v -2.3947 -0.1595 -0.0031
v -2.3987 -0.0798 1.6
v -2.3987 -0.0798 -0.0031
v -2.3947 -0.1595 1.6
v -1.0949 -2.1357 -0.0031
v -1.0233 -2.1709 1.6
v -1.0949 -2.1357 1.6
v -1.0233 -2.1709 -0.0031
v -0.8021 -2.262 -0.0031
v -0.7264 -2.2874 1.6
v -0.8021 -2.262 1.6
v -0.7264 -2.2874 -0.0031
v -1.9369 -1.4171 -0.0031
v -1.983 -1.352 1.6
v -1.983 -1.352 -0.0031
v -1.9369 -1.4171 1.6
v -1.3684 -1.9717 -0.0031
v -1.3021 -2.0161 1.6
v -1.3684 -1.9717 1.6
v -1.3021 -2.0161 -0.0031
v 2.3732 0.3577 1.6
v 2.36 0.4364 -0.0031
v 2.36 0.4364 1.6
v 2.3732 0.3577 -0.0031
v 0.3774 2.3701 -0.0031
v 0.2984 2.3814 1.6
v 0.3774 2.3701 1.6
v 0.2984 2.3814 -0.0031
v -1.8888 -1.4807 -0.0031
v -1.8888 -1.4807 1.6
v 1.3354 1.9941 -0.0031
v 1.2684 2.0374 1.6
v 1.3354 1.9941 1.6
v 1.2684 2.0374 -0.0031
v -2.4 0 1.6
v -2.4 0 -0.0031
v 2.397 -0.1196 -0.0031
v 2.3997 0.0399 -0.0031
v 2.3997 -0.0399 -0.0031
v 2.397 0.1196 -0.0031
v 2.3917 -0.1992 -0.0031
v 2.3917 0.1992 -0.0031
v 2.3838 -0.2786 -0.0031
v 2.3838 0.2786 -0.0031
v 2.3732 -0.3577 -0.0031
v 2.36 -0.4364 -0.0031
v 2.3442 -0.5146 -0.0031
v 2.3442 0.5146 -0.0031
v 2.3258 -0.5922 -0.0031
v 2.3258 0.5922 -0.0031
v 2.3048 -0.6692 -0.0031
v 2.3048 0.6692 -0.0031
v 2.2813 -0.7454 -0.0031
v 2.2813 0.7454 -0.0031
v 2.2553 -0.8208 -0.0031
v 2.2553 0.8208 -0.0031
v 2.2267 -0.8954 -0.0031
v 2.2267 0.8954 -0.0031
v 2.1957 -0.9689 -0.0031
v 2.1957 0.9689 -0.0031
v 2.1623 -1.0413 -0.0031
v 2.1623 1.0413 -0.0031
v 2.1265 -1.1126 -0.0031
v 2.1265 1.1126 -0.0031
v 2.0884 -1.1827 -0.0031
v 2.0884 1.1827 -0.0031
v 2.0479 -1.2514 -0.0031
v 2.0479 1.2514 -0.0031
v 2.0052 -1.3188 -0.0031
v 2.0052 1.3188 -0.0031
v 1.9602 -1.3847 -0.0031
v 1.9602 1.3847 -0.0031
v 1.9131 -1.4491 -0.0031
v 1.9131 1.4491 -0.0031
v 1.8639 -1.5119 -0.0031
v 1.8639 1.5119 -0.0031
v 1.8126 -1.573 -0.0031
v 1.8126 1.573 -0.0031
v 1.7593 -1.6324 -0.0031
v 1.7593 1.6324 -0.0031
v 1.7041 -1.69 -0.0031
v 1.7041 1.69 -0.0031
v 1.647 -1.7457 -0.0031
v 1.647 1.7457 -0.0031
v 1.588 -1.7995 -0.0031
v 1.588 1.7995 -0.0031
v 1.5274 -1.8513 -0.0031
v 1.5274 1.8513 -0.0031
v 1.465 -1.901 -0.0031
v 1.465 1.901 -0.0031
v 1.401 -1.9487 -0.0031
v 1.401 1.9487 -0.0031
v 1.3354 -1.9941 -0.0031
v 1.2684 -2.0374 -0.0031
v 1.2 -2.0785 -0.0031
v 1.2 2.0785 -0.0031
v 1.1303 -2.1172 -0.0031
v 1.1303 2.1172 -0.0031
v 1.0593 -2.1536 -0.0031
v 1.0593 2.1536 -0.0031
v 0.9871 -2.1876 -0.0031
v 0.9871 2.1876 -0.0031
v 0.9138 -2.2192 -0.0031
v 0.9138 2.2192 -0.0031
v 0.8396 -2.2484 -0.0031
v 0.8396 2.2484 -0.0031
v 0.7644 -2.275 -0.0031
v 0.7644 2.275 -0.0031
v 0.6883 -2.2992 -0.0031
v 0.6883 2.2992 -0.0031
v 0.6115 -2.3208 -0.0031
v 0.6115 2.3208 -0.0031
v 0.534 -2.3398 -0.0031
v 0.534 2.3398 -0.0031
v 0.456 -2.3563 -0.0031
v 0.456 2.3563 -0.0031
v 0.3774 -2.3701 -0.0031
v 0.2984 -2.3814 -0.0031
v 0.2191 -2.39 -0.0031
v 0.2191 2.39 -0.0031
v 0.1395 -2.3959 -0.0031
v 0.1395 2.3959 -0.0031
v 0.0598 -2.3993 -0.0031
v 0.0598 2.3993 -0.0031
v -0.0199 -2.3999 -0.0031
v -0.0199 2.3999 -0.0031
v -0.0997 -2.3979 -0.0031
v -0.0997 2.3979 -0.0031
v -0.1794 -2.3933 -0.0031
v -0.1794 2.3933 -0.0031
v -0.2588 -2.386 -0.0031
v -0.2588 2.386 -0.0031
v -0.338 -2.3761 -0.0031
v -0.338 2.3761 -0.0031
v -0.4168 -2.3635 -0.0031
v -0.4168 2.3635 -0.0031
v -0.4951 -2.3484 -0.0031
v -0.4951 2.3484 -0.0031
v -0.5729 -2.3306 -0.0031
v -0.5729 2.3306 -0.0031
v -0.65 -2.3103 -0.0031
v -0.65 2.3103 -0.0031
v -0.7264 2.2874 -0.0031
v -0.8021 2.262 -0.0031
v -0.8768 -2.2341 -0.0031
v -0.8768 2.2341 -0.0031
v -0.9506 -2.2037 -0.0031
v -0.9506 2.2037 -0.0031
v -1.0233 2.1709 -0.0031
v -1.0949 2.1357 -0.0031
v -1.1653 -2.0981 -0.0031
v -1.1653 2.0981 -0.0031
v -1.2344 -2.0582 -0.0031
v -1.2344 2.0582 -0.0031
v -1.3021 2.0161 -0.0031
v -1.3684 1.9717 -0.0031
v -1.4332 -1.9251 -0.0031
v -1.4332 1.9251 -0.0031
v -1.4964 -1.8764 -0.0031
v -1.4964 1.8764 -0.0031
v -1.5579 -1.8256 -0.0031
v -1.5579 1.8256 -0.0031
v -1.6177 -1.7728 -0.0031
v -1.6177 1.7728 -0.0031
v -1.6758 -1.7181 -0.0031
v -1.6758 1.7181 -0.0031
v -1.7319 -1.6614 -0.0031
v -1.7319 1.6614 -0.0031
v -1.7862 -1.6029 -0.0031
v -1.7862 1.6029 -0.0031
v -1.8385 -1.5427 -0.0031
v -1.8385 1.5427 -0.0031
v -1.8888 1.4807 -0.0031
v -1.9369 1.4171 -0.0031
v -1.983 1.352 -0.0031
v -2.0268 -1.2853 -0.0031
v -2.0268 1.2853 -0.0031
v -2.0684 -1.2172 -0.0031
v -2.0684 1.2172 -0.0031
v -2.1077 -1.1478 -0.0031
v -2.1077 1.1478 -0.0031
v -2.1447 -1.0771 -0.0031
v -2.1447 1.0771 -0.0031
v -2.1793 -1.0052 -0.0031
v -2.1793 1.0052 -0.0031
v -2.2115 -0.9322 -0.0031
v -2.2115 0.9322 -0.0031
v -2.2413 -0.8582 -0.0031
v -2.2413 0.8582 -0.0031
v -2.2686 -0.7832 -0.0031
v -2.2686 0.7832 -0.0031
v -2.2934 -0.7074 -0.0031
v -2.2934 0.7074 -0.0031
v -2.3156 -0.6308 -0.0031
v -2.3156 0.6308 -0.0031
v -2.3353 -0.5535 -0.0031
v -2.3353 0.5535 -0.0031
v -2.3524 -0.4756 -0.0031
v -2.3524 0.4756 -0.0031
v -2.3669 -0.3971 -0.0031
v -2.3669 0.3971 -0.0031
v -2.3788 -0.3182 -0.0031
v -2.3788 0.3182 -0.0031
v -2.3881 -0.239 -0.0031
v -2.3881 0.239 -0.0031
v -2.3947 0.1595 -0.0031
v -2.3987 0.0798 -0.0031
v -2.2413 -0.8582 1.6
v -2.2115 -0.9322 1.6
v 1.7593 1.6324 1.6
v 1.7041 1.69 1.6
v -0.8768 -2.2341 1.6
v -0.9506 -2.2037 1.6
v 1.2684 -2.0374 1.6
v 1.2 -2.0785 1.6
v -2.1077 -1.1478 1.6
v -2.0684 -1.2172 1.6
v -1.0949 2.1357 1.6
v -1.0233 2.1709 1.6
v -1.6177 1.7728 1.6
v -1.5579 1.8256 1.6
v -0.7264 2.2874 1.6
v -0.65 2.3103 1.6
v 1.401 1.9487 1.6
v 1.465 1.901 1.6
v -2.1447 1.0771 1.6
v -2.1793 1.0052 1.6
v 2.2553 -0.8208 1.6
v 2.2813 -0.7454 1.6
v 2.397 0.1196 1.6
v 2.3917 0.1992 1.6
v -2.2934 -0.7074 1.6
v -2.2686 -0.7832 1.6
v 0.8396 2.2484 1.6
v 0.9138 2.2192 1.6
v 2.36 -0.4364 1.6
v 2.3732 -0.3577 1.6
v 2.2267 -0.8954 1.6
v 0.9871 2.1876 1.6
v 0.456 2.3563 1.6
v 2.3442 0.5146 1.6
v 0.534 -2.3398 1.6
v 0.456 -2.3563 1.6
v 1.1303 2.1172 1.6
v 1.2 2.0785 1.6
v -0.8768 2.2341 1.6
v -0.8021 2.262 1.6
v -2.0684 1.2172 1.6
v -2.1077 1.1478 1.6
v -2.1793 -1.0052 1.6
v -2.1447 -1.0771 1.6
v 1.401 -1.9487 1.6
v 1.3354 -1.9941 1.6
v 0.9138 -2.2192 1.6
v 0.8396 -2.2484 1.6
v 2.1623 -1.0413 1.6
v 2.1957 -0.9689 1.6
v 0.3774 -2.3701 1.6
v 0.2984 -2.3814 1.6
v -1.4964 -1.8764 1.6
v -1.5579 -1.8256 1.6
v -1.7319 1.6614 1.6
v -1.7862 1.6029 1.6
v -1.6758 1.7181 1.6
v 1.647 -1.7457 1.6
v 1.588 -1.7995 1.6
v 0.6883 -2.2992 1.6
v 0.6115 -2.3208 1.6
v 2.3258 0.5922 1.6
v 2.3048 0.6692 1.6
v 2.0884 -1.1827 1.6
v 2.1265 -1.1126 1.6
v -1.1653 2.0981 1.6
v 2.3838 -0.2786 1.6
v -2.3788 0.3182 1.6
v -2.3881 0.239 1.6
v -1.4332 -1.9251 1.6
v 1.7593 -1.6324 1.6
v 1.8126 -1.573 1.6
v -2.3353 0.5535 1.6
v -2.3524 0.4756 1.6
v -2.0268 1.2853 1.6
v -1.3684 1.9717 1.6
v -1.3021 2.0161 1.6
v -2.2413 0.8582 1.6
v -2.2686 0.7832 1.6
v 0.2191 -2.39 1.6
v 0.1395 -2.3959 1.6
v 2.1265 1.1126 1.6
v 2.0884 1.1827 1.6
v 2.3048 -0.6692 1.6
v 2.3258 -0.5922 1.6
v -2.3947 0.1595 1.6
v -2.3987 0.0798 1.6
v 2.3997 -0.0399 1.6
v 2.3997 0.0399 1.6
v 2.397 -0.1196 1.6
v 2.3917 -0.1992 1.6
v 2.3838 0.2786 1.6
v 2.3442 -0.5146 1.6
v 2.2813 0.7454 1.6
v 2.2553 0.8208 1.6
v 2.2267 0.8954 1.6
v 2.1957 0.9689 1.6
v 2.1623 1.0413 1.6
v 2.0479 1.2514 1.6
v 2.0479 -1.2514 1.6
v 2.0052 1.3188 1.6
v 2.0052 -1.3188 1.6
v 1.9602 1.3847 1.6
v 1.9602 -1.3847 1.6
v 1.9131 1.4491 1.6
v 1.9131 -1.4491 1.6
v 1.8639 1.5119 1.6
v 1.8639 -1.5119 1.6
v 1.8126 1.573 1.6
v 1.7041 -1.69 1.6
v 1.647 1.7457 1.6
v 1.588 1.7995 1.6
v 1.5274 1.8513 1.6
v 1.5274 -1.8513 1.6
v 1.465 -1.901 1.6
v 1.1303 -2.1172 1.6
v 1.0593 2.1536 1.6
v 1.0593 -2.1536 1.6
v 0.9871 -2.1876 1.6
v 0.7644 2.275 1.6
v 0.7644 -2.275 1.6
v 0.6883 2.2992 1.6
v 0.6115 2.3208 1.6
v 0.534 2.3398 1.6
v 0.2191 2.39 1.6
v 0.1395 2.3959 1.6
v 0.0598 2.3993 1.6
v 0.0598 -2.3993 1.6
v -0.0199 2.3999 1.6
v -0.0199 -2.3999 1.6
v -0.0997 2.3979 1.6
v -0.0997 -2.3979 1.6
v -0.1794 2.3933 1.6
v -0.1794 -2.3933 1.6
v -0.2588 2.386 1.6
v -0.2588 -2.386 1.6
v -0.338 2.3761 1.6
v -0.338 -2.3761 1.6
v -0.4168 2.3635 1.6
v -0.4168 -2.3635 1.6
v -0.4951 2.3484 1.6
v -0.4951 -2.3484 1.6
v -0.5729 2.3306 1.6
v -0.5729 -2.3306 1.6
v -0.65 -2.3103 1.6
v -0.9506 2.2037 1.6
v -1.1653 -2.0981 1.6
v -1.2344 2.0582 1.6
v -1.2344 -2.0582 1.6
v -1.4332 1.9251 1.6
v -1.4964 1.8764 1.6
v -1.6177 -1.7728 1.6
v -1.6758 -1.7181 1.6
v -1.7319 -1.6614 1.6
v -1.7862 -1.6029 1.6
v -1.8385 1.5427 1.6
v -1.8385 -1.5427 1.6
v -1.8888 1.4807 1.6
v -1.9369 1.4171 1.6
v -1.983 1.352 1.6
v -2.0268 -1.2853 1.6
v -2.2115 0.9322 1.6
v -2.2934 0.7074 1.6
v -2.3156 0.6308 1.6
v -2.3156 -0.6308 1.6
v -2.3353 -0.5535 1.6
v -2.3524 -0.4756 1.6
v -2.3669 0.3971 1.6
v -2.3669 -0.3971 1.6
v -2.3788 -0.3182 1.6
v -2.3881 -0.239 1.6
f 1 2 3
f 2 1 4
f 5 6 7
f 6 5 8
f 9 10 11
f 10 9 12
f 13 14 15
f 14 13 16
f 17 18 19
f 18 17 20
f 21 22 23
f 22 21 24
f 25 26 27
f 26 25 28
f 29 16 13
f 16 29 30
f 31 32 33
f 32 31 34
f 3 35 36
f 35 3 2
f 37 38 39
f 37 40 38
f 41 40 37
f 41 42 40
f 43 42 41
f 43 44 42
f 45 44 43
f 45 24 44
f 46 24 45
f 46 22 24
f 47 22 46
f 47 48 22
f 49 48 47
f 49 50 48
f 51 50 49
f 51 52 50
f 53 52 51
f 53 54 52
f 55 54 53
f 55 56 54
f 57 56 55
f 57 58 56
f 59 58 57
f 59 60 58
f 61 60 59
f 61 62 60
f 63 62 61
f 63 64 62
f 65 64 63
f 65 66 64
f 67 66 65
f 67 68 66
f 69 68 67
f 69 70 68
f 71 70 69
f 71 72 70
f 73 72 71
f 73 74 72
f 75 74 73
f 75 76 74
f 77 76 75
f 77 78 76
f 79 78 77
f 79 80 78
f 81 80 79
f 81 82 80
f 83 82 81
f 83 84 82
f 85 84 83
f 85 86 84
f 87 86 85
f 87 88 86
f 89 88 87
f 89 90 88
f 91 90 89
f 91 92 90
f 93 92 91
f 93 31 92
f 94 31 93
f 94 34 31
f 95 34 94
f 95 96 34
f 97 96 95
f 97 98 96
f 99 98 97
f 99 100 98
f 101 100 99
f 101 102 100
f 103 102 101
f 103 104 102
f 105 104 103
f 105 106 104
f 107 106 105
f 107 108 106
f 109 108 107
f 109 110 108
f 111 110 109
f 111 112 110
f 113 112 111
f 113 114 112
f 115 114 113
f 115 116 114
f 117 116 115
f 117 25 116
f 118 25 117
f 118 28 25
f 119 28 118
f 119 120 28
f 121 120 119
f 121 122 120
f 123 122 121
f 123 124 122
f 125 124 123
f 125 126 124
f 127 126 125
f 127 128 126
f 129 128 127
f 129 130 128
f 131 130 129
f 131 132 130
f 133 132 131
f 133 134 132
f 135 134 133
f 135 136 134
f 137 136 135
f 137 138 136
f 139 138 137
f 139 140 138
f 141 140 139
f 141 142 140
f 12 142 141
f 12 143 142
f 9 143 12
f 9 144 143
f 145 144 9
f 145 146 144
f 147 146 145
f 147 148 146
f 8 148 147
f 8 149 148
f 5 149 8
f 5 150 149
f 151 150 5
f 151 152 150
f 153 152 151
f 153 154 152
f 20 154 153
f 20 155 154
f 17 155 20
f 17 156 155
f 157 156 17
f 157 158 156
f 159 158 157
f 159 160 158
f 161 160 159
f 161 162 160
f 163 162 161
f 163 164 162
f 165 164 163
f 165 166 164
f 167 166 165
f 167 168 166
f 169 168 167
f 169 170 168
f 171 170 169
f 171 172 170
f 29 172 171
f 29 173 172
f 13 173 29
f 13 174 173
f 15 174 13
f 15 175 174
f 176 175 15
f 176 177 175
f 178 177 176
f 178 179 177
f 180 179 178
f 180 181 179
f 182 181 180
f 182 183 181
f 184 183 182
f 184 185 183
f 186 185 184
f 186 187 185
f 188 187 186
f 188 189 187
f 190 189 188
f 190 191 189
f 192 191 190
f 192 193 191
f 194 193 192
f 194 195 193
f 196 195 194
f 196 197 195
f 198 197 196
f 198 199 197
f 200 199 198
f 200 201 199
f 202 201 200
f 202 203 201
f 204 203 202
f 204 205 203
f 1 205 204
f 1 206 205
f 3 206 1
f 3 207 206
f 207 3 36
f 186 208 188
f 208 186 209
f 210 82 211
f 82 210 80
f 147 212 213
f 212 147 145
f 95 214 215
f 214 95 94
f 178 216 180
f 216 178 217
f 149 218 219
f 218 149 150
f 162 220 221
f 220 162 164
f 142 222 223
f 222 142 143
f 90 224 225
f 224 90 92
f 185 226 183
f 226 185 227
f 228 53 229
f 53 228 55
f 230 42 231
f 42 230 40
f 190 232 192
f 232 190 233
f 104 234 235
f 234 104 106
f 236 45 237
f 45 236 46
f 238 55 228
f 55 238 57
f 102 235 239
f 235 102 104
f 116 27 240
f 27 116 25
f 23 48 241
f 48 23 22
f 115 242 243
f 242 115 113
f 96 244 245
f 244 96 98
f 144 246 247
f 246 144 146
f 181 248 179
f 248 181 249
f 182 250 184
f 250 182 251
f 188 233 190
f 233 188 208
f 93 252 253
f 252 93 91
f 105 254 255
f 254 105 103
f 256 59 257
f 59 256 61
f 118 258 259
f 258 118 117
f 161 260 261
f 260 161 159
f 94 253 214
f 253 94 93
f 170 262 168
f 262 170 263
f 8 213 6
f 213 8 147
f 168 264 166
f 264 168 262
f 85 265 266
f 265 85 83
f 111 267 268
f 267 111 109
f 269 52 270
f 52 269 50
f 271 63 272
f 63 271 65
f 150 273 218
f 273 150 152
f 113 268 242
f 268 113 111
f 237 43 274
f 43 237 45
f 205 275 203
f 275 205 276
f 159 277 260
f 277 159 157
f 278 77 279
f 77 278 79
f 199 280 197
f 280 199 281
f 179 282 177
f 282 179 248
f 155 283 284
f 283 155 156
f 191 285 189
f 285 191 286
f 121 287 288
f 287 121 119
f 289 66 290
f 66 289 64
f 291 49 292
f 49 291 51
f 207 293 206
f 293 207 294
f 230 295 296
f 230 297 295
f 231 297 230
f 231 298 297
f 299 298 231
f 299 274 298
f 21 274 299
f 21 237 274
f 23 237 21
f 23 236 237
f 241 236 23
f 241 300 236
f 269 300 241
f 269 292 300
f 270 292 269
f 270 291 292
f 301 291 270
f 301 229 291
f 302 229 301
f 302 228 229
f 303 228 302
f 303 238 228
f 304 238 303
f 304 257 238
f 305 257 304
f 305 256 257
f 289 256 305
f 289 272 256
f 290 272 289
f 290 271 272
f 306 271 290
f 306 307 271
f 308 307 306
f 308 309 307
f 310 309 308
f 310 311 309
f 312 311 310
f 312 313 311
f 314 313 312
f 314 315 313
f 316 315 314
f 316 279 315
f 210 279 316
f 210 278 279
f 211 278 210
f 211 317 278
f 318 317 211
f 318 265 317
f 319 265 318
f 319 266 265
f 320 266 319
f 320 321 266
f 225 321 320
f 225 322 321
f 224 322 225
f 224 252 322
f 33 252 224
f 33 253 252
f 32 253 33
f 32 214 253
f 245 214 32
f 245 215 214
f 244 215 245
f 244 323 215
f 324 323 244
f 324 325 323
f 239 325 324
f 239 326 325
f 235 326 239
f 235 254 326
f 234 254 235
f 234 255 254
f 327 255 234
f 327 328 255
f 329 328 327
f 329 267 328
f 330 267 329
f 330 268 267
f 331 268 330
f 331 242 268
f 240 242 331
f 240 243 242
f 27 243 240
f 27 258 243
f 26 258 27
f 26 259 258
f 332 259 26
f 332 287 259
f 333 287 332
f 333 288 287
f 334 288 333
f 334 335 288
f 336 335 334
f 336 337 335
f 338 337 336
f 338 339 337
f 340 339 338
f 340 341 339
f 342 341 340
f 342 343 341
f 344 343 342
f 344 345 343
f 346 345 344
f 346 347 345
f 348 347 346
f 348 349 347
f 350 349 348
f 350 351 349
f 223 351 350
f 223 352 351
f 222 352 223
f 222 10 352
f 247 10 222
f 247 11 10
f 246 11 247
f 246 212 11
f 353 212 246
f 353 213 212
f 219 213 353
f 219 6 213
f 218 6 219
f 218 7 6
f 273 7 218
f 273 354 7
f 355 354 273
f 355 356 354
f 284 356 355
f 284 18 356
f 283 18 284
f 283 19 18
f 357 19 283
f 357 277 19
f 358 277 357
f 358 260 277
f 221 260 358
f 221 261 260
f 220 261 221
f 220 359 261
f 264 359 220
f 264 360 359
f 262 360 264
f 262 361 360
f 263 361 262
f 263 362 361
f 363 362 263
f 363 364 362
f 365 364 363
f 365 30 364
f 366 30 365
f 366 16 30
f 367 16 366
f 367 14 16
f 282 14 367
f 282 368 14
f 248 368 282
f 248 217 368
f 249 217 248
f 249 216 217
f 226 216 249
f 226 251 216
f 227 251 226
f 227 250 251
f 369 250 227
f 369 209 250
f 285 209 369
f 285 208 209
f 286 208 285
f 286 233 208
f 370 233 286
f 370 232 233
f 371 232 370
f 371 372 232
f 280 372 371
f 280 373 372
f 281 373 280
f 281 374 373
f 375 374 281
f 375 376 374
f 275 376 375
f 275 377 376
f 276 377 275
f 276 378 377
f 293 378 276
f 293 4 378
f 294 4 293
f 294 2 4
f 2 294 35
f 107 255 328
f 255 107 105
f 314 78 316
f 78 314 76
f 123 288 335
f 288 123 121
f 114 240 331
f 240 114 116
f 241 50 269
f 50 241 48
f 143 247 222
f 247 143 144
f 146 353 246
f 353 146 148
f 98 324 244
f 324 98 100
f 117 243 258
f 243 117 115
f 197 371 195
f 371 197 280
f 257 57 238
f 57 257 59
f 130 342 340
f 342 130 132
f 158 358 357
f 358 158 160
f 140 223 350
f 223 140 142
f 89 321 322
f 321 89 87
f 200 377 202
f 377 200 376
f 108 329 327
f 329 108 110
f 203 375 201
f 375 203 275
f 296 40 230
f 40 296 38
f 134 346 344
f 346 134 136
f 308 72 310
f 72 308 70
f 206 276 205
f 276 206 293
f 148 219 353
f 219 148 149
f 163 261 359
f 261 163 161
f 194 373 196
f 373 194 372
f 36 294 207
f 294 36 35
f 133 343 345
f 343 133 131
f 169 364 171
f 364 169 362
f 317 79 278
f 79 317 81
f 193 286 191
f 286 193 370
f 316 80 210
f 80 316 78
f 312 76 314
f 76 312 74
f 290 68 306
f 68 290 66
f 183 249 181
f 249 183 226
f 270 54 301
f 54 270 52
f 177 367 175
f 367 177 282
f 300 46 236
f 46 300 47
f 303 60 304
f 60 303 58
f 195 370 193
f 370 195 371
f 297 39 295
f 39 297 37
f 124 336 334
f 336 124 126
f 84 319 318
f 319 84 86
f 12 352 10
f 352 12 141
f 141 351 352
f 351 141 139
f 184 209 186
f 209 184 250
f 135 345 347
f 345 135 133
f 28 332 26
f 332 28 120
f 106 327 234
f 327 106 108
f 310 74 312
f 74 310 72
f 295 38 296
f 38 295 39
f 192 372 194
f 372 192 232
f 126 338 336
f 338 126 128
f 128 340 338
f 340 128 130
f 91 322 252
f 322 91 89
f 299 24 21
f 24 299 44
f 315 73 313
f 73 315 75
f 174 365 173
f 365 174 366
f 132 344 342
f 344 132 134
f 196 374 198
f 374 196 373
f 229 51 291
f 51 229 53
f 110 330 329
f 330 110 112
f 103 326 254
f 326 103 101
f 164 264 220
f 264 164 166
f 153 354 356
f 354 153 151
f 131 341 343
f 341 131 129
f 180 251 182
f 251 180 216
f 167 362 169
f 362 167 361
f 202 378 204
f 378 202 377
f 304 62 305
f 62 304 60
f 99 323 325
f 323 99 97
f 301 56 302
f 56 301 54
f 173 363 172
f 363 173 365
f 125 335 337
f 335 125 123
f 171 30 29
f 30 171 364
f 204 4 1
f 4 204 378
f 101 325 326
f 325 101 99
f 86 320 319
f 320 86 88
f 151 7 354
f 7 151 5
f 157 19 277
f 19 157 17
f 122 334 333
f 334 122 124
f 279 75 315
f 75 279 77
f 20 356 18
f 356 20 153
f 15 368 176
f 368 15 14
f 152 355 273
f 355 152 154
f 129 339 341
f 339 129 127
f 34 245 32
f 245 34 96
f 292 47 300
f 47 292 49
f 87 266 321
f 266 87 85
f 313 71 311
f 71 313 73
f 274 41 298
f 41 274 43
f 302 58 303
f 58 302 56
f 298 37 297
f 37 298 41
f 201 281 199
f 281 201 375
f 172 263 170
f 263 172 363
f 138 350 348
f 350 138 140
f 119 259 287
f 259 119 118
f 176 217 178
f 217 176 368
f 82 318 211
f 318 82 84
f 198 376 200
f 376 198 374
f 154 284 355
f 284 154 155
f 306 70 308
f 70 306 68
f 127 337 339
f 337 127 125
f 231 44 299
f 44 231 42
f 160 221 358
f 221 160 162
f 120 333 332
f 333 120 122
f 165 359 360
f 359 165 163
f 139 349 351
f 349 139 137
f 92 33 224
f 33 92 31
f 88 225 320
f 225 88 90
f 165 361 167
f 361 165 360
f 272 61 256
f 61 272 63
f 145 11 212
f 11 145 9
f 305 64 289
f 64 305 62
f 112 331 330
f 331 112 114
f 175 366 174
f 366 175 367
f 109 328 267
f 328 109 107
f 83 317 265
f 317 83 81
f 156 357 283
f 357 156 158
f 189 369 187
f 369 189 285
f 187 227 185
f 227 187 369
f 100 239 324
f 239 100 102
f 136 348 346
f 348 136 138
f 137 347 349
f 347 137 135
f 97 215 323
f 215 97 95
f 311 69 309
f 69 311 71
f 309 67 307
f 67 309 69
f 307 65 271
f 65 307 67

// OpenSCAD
// file: ../p/4-4edge.scad
use <../lib.scad>
$fa=1; $fs=0.2;
function ldraw_lib__4_4edge(realsolid=false) = [
// 0 Circle 1.0
// 0 Name: 4-4edge.dat
// 0 Author: James Jessiman
// 0 !LDRAW_ORG Primitive UPDATE 2017-01
// 0 !LICENSE Licensed under CC BY 2.0 and CC BY 4.0 : see CAreadme.txt
// 
// 0 BFC CERTIFY CCW
  [0,"BFC","CERTIFY"],
  [0,"BFC","CCW"],
// 
// 0 !HISTORY 1998-12-15 [PTadmin] Official Update 1998-10
// 0 !HISTORY 2005-12-28 [PTadmin] Official Update 2005-01
// 0 !HISTORY 2007-06-24 [PTadmin] Header formatted for Contributor Agreement
// 0 !HISTORY 2008-07-01 [PTadmin] Official Update 2008-01
// 0 !HISTORY 2017-01-15 [Steffen] BFCed
// 0 !HISTORY 2017-12-30 [PTadmin] Official Update 2017-01
// 
// 
// 2 24 1 0 0 0.9239 0 0.3827
  [2,24,1,0,0,0.9239,0,0.3827],
// 2 24 0.9239 0 0.3827 0.7071 0 0.7071
  [2,24,0.9239,0,0.3827,0.7071,0,0.7071],
// 2 24 0.7071 0 0.7071 0.3827 0 0.9239
  [2,24,0.7071,0,0.7071,0.3827,0,0.9239],
// 2 24 0.3827 0 0.9239 0 0 1
  [2,24,0.3827,0,0.9239,0,0,1],
// 2 24 0 0 1 -0.3827 0 0.9239
  [2,24,0,0,1,-0.3827,0,0.9239],
// 2 24 -0.3827 0 0.9239 -0.7071 0 0.7071
  [2,24,-0.3827,0,0.9239,-0.7071,0,0.7071],
// 2 24 -0.7071 0 0.7071 -0.9239 0 0.3827
  [2,24,-0.7071,0,0.7071,-0.9239,0,0.3827],
// 2 24 -0.9239 0 0.3827 -1 0 -0
  [2,24,-0.9239,0,0.3827,-1,0,-0],
// 2 24 -1 0 -0 -0.9239 0 -0.3827
  [2,24,-1,0,-0,-0.9239,0,-0.3827],
// 2 24 -0.9239 0 -0.3827 -0.7071 0 -0.7071
  [2,24,-0.9239,0,-0.3827,-0.7071,0,-0.7071],
// 2 24 -0.7071 0 -0.7071 -0.3827 0 -0.9239
  [2,24,-0.7071,0,-0.7071,-0.3827,0,-0.9239],
// 2 24 -0.3827 0 -0.9239 0 0 -1
  [2,24,-0.3827,0,-0.9239,0,0,-1],
// 2 24 0 0 -1 0.3827 0 -0.9239
  [2,24,0,0,-1,0.3827,0,-0.9239],
// 2 24 0.3827 0 -0.9239 0.7071 0 -0.7071
  [2,24,0.3827,0,-0.9239,0.7071,0,-0.7071],
// 2 24 0.7071 0 -0.7071 0.9239 0 -0.3827
  [2,24,0.7071,0,-0.7071,0.9239,0,-0.3827],
// 2 24 0.9239 0 -0.3827 1 0 0
  [2,24,0.9239,0,-0.3827,1,0,0],
];
module ldraw_lib__4_4edge(step=0, col=false, unit=2/5, alt=false, line=0.2, solid=!$preview)
    makepoly(ldraw_lib__4_4edge(solid), step=step, col=col, unit=unit, alt=alt, line=line, solid=solid);
ldraw_lib__4_4edge(line=0.2);
// file: ../p/4-4disc.scad
use <../lib.scad>
$fa=1; $fs=0.2;
function ldraw_lib__4_4disc(realsolid=false) = [
// 0 Disc 1.0
// 0 Name: 4-4disc.dat
// 0 Author: James Jessiman
// 0 !LDRAW_ORG Primitive UPDATE 2002-02
// 0 !LICENSE Licensed under CC BY 2.0 and CC BY 4.0 : see CAreadme.txt
// 
// 0 BFC CERTIFY CCW
  [0,"BFC","CERTIFY"],
  [0,"BFC","CCW"],
// 
// 0 !HISTORY 1998-12-15 [PTadmin] Official Update 1998-10
// 0 !HISTORY 2002-03-23 [sbliss] Added BFC statement
// 0 !HISTORY 2002-04-25 [PTadmin] Official Update 2002-02
// 0 !HISTORY 2007-06-24 [PTadmin] Header formatted for Contributor Agreement
// 0 !HISTORY 2008-07-01 [PTadmin] Official Update 2008-01
// 
// 
// 3 16 0 0 0 1 0 0 0.9239 0 0.3827
  [3,16,0,0,0,1,0,0,0.9239,0,0.3827],
// 3 16 0 0 0 0.9239 0 0.3827 0.7071 0 0.7071
  [3,16,0,0,0,0.9239,0,0.3827,0.7071,0,0.7071],
// 3 16 0 0 0 0.7071 0 0.7071 0.3827 0 0.9239
  [3,16,0,0,0,0.7071,0,0.7071,0.3827,0,0.9239],
// 3 16 0 0 0 0.3827 0 0.9239 0 0 1
  [3,16,0,0,0,0.3827,0,0.9239,0,0,1],
// 3 16 0 0 0 0 0 1 -0.3827 0 0.9239
  [3,16,0,0,0,0,0,1,-0.3827,0,0.9239],
// 3 16 0 0 0 -0.3827 0 0.9239 -0.7071 0 0.7071
  [3,16,0,0,0,-0.3827,0,0.9239,-0.7071,0,0.7071],
// 3 16 0 0 0 -0.7071 0 0.7071 -0.9239 0 0.3827
  [3,16,0,0,0,-0.7071,0,0.7071,-0.9239,0,0.3827],
// 3 16 0 0 0 -0.9239 0 0.3827 -1 0 -0
  [3,16,0,0,0,-0.9239,0,0.3827,-1,0,-0],
// 3 16 0 0 0 -1 0 -0 -0.9239 0 -0.3827
  [3,16,0,0,0,-1,0,-0,-0.9239,0,-0.3827],
// 3 16 0 0 0 -0.9239 0 -0.3827 -0.7071 0 -0.7071
  [3,16,0,0,0,-0.9239,0,-0.3827,-0.7071,0,-0.7071],
// 3 16 0 0 0 -0.7071 0 -0.7071 -0.3827 0 -0.9239
  [3,16,0,0,0,-0.7071,0,-0.7071,-0.3827,0,-0.9239],
// 3 16 0 0 0 -0.3827 0 -0.9239 0 0 -1
  [3,16,0,0,0,-0.3827,0,-0.9239,0,0,-1],
// 3 16 0 0 0 0 0 -1 0.3827 0 -0.9239
  [3,16,0,0,0,0,0,-1,0.3827,0,-0.9239],
// 3 16 0 0 0 0.3827 0 -0.9239 0.7071 0 -0.7071
  [3,16,0,0,0,0.3827,0,-0.9239,0.7071,0,-0.7071],
// 3 16 0 0 0 0.7071 0 -0.7071 0.9239 0 -0.3827
  [3,16,0,0,0,0.7071,0,-0.7071,0.9239,0,-0.3827],
// 3 16 0 0 0 0.9239 0 -0.3827 1 0 0
  [3,16,0,0,0,0.9239,0,-0.3827,1,0,0],
// 0
];
module ldraw_lib__4_4disc(step=0, col=false, unit=2/5, alt=false, line=0.2, solid=!$preview)
    makepoly(ldraw_lib__4_4disc(solid), step=step, col=col, unit=unit, alt=alt, line=line, solid=solid);
ldraw_lib__4_4disc(line=0.2);
// file: ../p/4-4cyli.scad
use <../lib.scad>
$fa=1; $fs=0.2;
function ldraw_lib__4_4cyli(realsolid=false) = [
// 0 Cylinder 1.0
// 0 Name: 4-4cyli.dat
// 0 Author: James Jessiman
// 0 !LDRAW_ORG Primitive UPDATE 2005-01
// 0 !LICENSE Licensed under CC BY 2.0 and CC BY 4.0 : see CAreadme.txt
// 
// 0 BFC CERTIFY CCW
  [0,"BFC","CERTIFY"],
  [0,"BFC","CCW"],
// 
// 0 !HISTORY 1998-12-15 [PTadmin] Official Update 1998-10
// 0 !HISTORY 2002-03-23 [sbliss] Added BFC statement; merged headers from files in distributions LDraw 0.27 and Complete.
// 0 !HISTORY 2002-04-25 [PTadmin] Official Update 2002-02
// 0 !HISTORY 2004-12-14 [guyvivan] BFC CCW
// 0 !HISTORY 2005-12-28 [PTadmin] Official Update 2005-01
// 0 !HISTORY 2007-06-24 [PTadmin] Header formatted for Contributor Agreement
// 0 !HISTORY 2008-07-01 [PTadmin] Official Update 2008-01
// 
// 
// 4 16 1 1 0 0.9239 1 0.3827 0.9239 0 0.3827 1 0 0
  [4,16,1,1,0,0.9239,1,0.3827,0.9239,0,0.3827,1,0,0],
// 5 24 1 0 0 1 1 0 0.9239 0 0.3827 0.9239 0 -0.3827
  [5,24,1,0,0,1,1,0,0.9239,0,0.3827,0.9239,0,-0.3827],
// 4 16 0.9239 1 0.3827 0.7071 1 0.7071 0.7071 0 0.7071 0.9239 0 0.3827
  [4,16,0.9239,1,0.3827,0.7071,1,0.7071,0.7071,0,0.7071,0.9239,0,0.3827],
// 5 24 0.9239 0 0.3827 0.9239 1 0.3827 0.7071 0 0.7071 1 0 0
  [5,24,0.9239,0,0.3827,0.9239,1,0.3827,0.7071,0,0.7071,1,0,0],
// 4 16 0.7071 1 0.7071 0.3827 1 0.9239 0.3827 0 0.9239 0.7071 0 0.7071
  [4,16,0.7071,1,0.7071,0.3827,1,0.9239,0.3827,0,0.9239,0.7071,0,0.7071],
// 5 24 0.7071 0 0.7071 0.7071 1 0.7071 0.3827 0 0.9239 0.9239 0 0.3827
  [5,24,0.7071,0,0.7071,0.7071,1,0.7071,0.3827,0,0.9239,0.9239,0,0.3827],
// 4 16 0.3827 1 0.9239 0 1 1 0 0 1 0.3827 0 0.9239
  [4,16,0.3827,1,0.9239,0,1,1,0,0,1,0.3827,0,0.9239],
// 5 24 0.3827 0 0.9239 0.3827 1 0.9239 0 0 1 0.7071 0 0.7071
  [5,24,0.3827,0,0.9239,0.3827,1,0.9239,0,0,1,0.7071,0,0.7071],
// 4 16 0 1 1 -0.3827 1 0.9239 -0.3827 0 0.9239 0 0 1
  [4,16,0,1,1,-0.3827,1,0.9239,-0.3827,0,0.9239,0,0,1],
// 5 24 0 0 1 0 1 1 -0.3827 0 0.9239 0.3827 0 0.9239
  [5,24,0,0,1,0,1,1,-0.3827,0,0.9239,0.3827,0,0.9239],
// 4 16 -0.3827 1 0.9239 -0.7071 1 0.7071 -0.7071 0 0.7071 -0.3827 0 0.9239
  [4,16,-0.3827,1,0.9239,-0.7071,1,0.7071,-0.7071,0,0.7071,-0.3827,0,0.9239],
// 5 24 -0.3827 0 0.9239 -0.3827 1 0.9239 -0.7071 0 0.7071 0 0 1
  [5,24,-0.3827,0,0.9239,-0.3827,1,0.9239,-0.7071,0,0.7071,0,0,1],
// 4 16 -0.7071 1 0.7071 -0.9239 1 0.3827 -0.9239 0 0.3827 -0.7071 0 0.7071
  [4,16,-0.7071,1,0.7071,-0.9239,1,0.3827,-0.9239,0,0.3827,-0.7071,0,0.7071],
// 5 24 -0.7071 0 0.7071 -0.7071 1 0.7071 -0.9239 0 0.3827 -0.3827 0 0.9239
  [5,24,-0.7071,0,0.7071,-0.7071,1,0.7071,-0.9239,0,0.3827,-0.3827,0,0.9239],
// 4 16 -0.9239 1 0.3827 -1 1 0 -1 0 0 -0.9239 0 0.3827
  [4,16,-0.9239,1,0.3827,-1,1,0,-1,0,0,-0.9239,0,0.3827],
// 5 24 -0.9239 0 0.3827 -0.9239 1 0.3827 -1 0 0 -0.7071 0 0.7071
  [5,24,-0.9239,0,0.3827,-0.9239,1,0.3827,-1,0,0,-0.7071,0,0.7071],
// 4 16 -1 1 0 -0.9239 1 -0.3827 -0.9239 0 -0.3827 -1 0 0
  [4,16,-1,1,0,-0.9239,1,-0.3827,-0.9239,0,-0.3827,-1,0,0],
// 5 24 -1 0 0 -1 1 0 -0.9239 0 -0.3827 -0.9239 0 0.3827
  [5,24,-1,0,0,-1,1,0,-0.9239,0,-0.3827,-0.9239,0,0.3827],
// 4 16 -0.9239 1 -0.3827 -0.7071 1 -0.7071 -0.7071 0 -0.7071 -0.9239 0 -0.3827
  [4,16,-0.9239,1,-0.3827,-0.7071,1,-0.7071,-0.7071,0,-0.7071,-0.9239,0,-0.3827],
// 5 24 -0.9239 0 -0.3827 -0.9239 1 -0.3827 -0.7071 0 -0.7071 -1 0 0
  [5,24,-0.9239,0,-0.3827,-0.9239,1,-0.3827,-0.7071,0,-0.7071,-1,0,0],
// 4 16 -0.7071 1 -0.7071 -0.3827 1 -0.9239 -0.3827 0 -0.9239 -0.7071 0 -0.7071
  [4,16,-0.7071,1,-0.7071,-0.3827,1,-0.9239,-0.3827,0,-0.9239,-0.7071,0,-0.7071],
// 5 24 -0.7071 0 -0.7071 -0.7071 1 -0.7071 -0.3827 0 -0.9239 -0.9239 0 -0.3827
  [5,24,-0.7071,0,-0.7071,-0.7071,1,-0.7071,-0.3827,0,-0.9239,-0.9239,0,-0.3827],
// 4 16 -0.3827 1 -0.9239 0 1 -1 0 0 -1 -0.3827 0 -0.9239
  [4,16,-0.3827,1,-0.9239,0,1,-1,0,0,-1,-0.3827,0,-0.9239],
// 5 24 -0.3827 0 -0.9239 -0.3827 1 -0.9239 0 0 -1 -0.7071 0 -0.7071
  [5,24,-0.3827,0,-0.9239,-0.3827,1,-0.9239,0,0,-1,-0.7071,0,-0.7071],
// 4 16 0 1 -1 0.3827 1 -0.9239 0.3827 0 -0.9239 0 0 -1
  [4,16,0,1,-1,0.3827,1,-0.9239,0.3827,0,-0.9239,0,0,-1],
// 5 24 0 0 -1 0 1 -1 0.3827 0 -0.9239 -0.3827 0 -0.9239
  [5,24,0,0,-1,0,1,-1,0.3827,0,-0.9239,-0.3827,0,-0.9239],
// 4 16 0.3827 1 -0.9239 0.7071 1 -0.7071 0.7071 0 -0.7071 0.3827 0 -0.9239
  [4,16,0.3827,1,-0.9239,0.7071,1,-0.7071,0.7071,0,-0.7071,0.3827,0,-0.9239],
// 5 24 0.3827 0 -0.9239 0.3827 1 -0.9239 0.7071 0 -0.7071 0 0 -1
  [5,24,0.3827,0,-0.9239,0.3827,1,-0.9239,0.7071,0,-0.7071,0,0,-1],
// 4 16 0.7071 1 -0.7071 0.9239 1 -0.3827 0.9239 0 -0.3827 0.7071 0 -0.7071
  [4,16,0.7071,1,-0.7071,0.9239,1,-0.3827,0.9239,0,-0.3827,0.7071,0,-0.7071],
// 5 24 0.7071 0 -0.7071 0.7071 1 -0.7071 0.9239 0 -0.3827 0.3827 0 -0.9239
  [5,24,0.7071,0,-0.7071,0.7071,1,-0.7071,0.9239,0,-0.3827,0.3827,0,-0.9239],
// 4 16 0.9239 1 -0.3827 1 1 0 1 0 0 0.9239 0 -0.3827
  [4,16,0.9239,1,-0.3827,1,1,0,1,0,0,0.9239,0,-0.3827],
// 5 24 0.9239 0 -0.3827 0.9239 1 -0.3827 1 0 0 0.7071 0 -0.7071
  [5,24,0.9239,0,-0.3827,0.9239,1,-0.3827,1,0,0,0.7071,0,-0.7071],
// 0
];
module ldraw_lib__4_4cyli(step=0, col=false, unit=2/5, alt=false, line=0.2, solid=!$preview)
    makepoly(ldraw_lib__4_4cyli(solid), step=step, col=col, unit=unit, alt=alt, line=line, solid=solid);
ldraw_lib__4_4cyli(line=0.2);
// file: ../p/stud3.scad
use <../lib.scad>
use <4-4cyli.scad>
use <4-4disc.scad>
use <4-4edge.scad>
$fa=1; $fs=0.2;
function ldraw_lib__stud3(realsolid=false) = realsolid ? 
    [openscad(translate([0,0,-eps()], o=cylinder(4+eps(), r=4)),2)] : [
// 0 Stud Tube Solid
// 0 Name: stud3.dat
// 0 Author: James Jessiman
// 0 !LDRAW_ORG Primitive UPDATE 2012-01
// 0 !LICENSE Licensed under CC BY 2.0 and CC BY 4.0 : see CAreadme.txt
// 
// 0 BFC CERTIFY CCW
  [0,"BFC","CERTIFY"],
  [0,"BFC","CCW"],
// 
// 0 !HISTORY 2002-04-04 [sbliss] Modified for BFC compliance
// 0 !HISTORY 2002-04-25 [PTadmin] Official Update 2002-02
// 0 !HISTORY 2007-06-24 [PTadmin] Header formatted for Contributor Agreement
// 0 !HISTORY 2008-07-01 [PTadmin] Official Update 2008-01
// 0 !HISTORY 2012-02-16 [Philo] Changed to CCW
// 0 !HISTORY 2012-03-30 [PTadmin] Official Update 2012-01
// 
// 
// 1 16 0 -4 0 4 0 0 0 1 0 0 0 4 4-4edge.dat
  [1,16,0,-4,0,4,0,0,0,1,0,0,0,4, ldraw_lib__4_4edge(realsolid)],
// 1 16 0 0 0 4 0 0 0 1 0 0 0 4 4-4edge.dat
  [1,16,0,0,0,4,0,0,0,1,0,0,0,4, ldraw_lib__4_4edge(realsolid)],
// 1 16 0 -4 0 4 0 0 0 1 0 0 0 4 4-4disc.dat
  [1,16,0,-4,0,4,0,0,0,1,0,0,0,4, ldraw_lib__4_4disc(realsolid)],
// 1 16 0 -4 0 4 0 0 0 4 0 0 0 4 4-4cyli.dat
  [1,16,0,-4,0,4,0,0,0,4,0,0,0,4, ldraw_lib__4_4cyli(realsolid)],
];
module ldraw_lib__stud3(step=0, col=false, unit=2/5, alt=false, line=0.2, solid=!$preview)
    makepoly(ldraw_lib__stud3(solid), step=step, col=col, unit=unit, alt=alt, line=line, solid=solid);
ldraw_lib__stud3(line=0.2);
// file: ../p/stud.scad
use <../lib.scad>
use <4-4cyli.scad>
use <4-4disc.scad>
use <4-4edge.scad>
$fa=1; $fs=0.2;
function ldraw_lib__stud(realsolid=false) = realsolid ? 
    [openscad(translate([0,0,-eps()], o=cylinder(4+eps(), r=6)),2)] : [
// 0 Stud
// 0 Name: stud.dat
// 0 Author: James Jessiman
// 0 !LDRAW_ORG Primitive UPDATE 2012-01
// 0 !LICENSE Licensed under CC BY 2.0 and CC BY 4.0 : see CAreadme.txt
// 
// 0 BFC CERTIFY CCW
  [0,"BFC","CERTIFY"],
  [0,"BFC","CCW"],
// 
// 0 !HISTORY 2002-04-04 [sbliss] Modified for BFC compliance
// 0 !HISTORY 2002-04-25 [PTadmin] Official Update 2002-02
// 0 !HISTORY 2007-06-24 [PTadmin] Header formatted for Contributor Agreement
// 0 !HISTORY 2008-07-01 [PTadmin] Official Update 2008-01
// 0 !HISTORY 2012-02-16 [Philo] Changed to CCW
// 0 !HISTORY 2012-03-30 [PTadmin] Official Update 2012-01
// 
// 
// 1 16 0 0 0 6 0 0 0 1 0 0 0 6 4-4edge.dat
  [1,16,0,0,0,6,0,0,0,1,0,0,0,6, ldraw_lib__4_4edge(realsolid)],
// 1 16 0 -4 0 6 0 0 0 1 0 0 0 6 4-4edge.dat
  [1,16,0,-4,0,6,0,0,0,1,0,0,0,6, ldraw_lib__4_4edge(realsolid)],
// 1 16 0 0 0 6 0 0 0 -4 0 0 0 6 4-4cyli.dat
  [1,16,0,0,0,6,0,0,0,-4,0,0,0,6, ldraw_lib__4_4cyli(realsolid)],
// 1 16 0 -4 0 6 0 0 0 1 0 0 0 6 4-4disc.dat
  [1,16,0,-4,0,6,0,0,0,1,0,0,0,6, ldraw_lib__4_4disc(realsolid)],
];
module ldraw_lib__stud(step=0, col=false, unit=2/5, alt=false, line=0.2, solid=!$preview)
    makepoly(ldraw_lib__stud(solid), step=step, col=col, unit=unit, alt=alt, line=line, solid=solid);
ldraw_lib__stud(line=0.2);
// file: ../p/box5.scad
use <../lib.scad>
$fa=1; $fs=0.2;
function ldraw_lib__box5(realsolid=false) = [
// 0 Box with 5 Faces and All Edges
// 0 Name: box5.dat
// 0 Author: James Jessiman
// 0 !LDRAW_ORG Primitive UPDATE 2012-01
// 0 !LICENSE Licensed under CC BY 2.0 and CC BY 4.0 : see CAreadme.txt
// 
// 0 BFC CERTIFY CCW
  [0,"BFC","CERTIFY"],
  [0,"BFC","CCW"],
// 
// 0 !HISTORY 2002-04-03 [sbliss] Modified for BFC compliance
// 0 !HISTORY 2002-04-25 [PTadmin] Official Update 2002-02
// 0 !HISTORY 2007-06-24 [PTadmin] Header formatted for Contributor Agreement
// 0 !HISTORY 2008-07-01 [PTadmin] Official Update 2008-01
// 0 !HISTORY 2012-02-16 [Philo] Changed to CCW
// 0 !HISTORY 2012-03-30 [PTadmin] Official Update 2012-01
// 
// 
// 2 24 1 1 1 -1 1 1
  [2,24,1,1,1,-1,1,1],
// 2 24 -1 1 1 -1 1 -1
  [2,24,-1,1,1,-1,1,-1],
// 2 24 -1 1 -1 1 1 -1
  [2,24,-1,1,-1,1,1,-1],
// 2 24 1 1 -1 1 1 1
  [2,24,1,1,-1,1,1,1],
// 2 24 1 0 1 -1 0 1
  [2,24,1,0,1,-1,0,1],
// 2 24 -1 0 1 -1 0 -1
  [2,24,-1,0,1,-1,0,-1],
// 2 24 -1 0 -1 1 0 -1
  [2,24,-1,0,-1,1,0,-1],
// 2 24 1 0 -1 1 0 1
  [2,24,1,0,-1,1,0,1],
// 2 24 1 0 1 1 1 1
  [2,24,1,0,1,1,1,1],
// 2 24 -1 0 1 -1 1 1
  [2,24,-1,0,1,-1,1,1],
// 2 24 1 0 -1 1 1 -1
  [2,24,1,0,-1,1,1,-1],
// 2 24 -1 0 -1 -1 1 -1
  [2,24,-1,0,-1,-1,1,-1],
// 4 16 -1 1 1 1 1 1 1 1 -1 -1 1 -1
  [4,16,-1,1,1,1,1,1,1,1,-1,-1,1,-1],
// 4 16 -1 1 1 -1 0 1 1 0 1 1 1 1
  [4,16,-1,1,1,-1,0,1,1,0,1,1,1,1],
// 4 16 -1 1 -1 -1 0 -1 -1 0 1 -1 1 1
  [4,16,-1,1,-1,-1,0,-1,-1,0,1,-1,1,1],
// 4 16 1 1 -1 1 0 -1 -1 0 -1 -1 1 -1
  [4,16,1,1,-1,1,0,-1,-1,0,-1,-1,1,-1],
// 4 16 1 1 1 1 0 1 1 0 -1 1 1 -1
  [4,16,1,1,1,1,0,1,1,0,-1,1,1,-1],
];
module ldraw_lib__box5(step=0, col=false, unit=2/5, alt=false, line=0.2, solid=!$preview)
    makepoly(ldraw_lib__box5(solid), step=step, col=col, unit=unit, alt=alt, line=line, solid=solid);
ldraw_lib__box5(line=0.2);
// file: ../p/box4t.scad
use <../lib.scad>
$fa=1; $fs=0.2;
function ldraw_lib__box4t(realsolid=false) = [
// 0 Box with 4 Adjacent Faces and All Edges
// 0 Name: box4t.dat
// 0 Author: Tore Eriksson [Tore_Eriksson]
// 0 !LDRAW_ORG Primitive UPDATE 2003-02
// 0 !LICENSE Licensed under CC BY 2.0 and CC BY 4.0 : see CAreadme.txt
// 
// 0 BFC CERTIFY CCW
  [0,"BFC","CERTIFY"],
  [0,"BFC","CCW"],
// 
// 0 !HISTORY 1997-09-29 [PTadmin] Official Update 1997-15
// 0 !HISTORY 2002-08-31 [izanette] Modified with WINDZ for BFC compliance
// 0 !HISTORY 2003-08-01 [PTadmin] Official Update 2003-02
// 0 !HISTORY 2007-06-24 [PTadmin] Header formatted for Contributor Agreement
// 0 !HISTORY 2008-07-01 [PTadmin] Official Update 2008-01
// 
// 
// 2 24 1 1 1 -1 1 1
  [2,24,1,1,1,-1,1,1],
// 2 24 -1 1 1 -1 1 -1
  [2,24,-1,1,1,-1,1,-1],
// 2 24 -1 1 -1 1 1 -1
  [2,24,-1,1,-1,1,1,-1],
// 2 24 1 1 -1 1 1 1
  [2,24,1,1,-1,1,1,1],
// 2 24 1 0 1 -1 0 1
  [2,24,1,0,1,-1,0,1],
// 2 24 -1 0 1 -1 0 -1
  [2,24,-1,0,1,-1,0,-1],
// 2 24 -1 0 -1 1 0 -1
  [2,24,-1,0,-1,1,0,-1],
// 2 24 1 0 -1 1 0 1
  [2,24,1,0,-1,1,0,1],
// 2 24 1 0 1 1 1 1
  [2,24,1,0,1,1,1,1],
// 2 24 -1 0 1 -1 1 1
  [2,24,-1,0,1,-1,1,1],
// 2 24 1 0 -1 1 1 -1
  [2,24,1,0,-1,1,1,-1],
// 2 24 -1 0 -1 -1 1 -1
  [2,24,-1,0,-1,-1,1,-1],
// 4 16 1 1 1 1 1 -1 -1 1 -1 -1 1 1
  [4,16,1,1,1,1,1,-1,-1,1,-1,-1,1,1],
// 4 16 1 1 1 -1 1 1 -1 0 1 1 0 1
  [4,16,1,1,1,-1,1,1,-1,0,1,1,0,1],
// 4 16 -1 1 1 -1 1 -1 -1 0 -1 -1 0 1
  [4,16,-1,1,1,-1,1,-1,-1,0,-1,-1,0,1],
// 0 4 16 -1 1 -1 -1 0 -1 1 0 -1 1 1 -1
// 4 16 1 1 -1 1 1 1 1 0 1 1 0 -1
  [4,16,1,1,-1,1,1,1,1,0,1,1,0,-1],
// 0
];
module ldraw_lib__box4t(step=0, col=false, unit=2/5, alt=false, line=0.2, solid=!$preview)
    makepoly(ldraw_lib__box4t(solid), step=step, col=col, unit=unit, alt=alt, line=line, solid=solid);
ldraw_lib__box4t(line=0.2);
// file: s/3004s01.scad
use <../../lib.scad>
use <../../p/box4t.scad>
use <../../p/box5.scad>
use <../../p/stud.scad>
use <../../p/stud3.scad>
$fa=1; $fs=0.2;
function ldraw_lib__s__3004s01(realsolid=false) = [
// 0 ~Brick  1 x  2 without Front Face
// 0 Name: s\3004s01.dat
// 0 Author: James Jessiman
// 0 !LDRAW_ORG Subpart UPDATE 2003-03
// 0 !LICENSE Licensed under CC BY 2.0 and CC BY 4.0 : see CAreadme.txt
// 
// 0 BFC CERTIFY CCW
  [0,"BFC","CERTIFY"],
  [0,"BFC","CCW"],
// 
// 0 !HISTORY 2003-09-07 [jriley] Subfiling, BFC
// 0 !HISTORY 2003-12-19 [PTadmin] Official Update 2003-03
// 0 !HISTORY 2007-08-29 [PTadmin] Header formatted for Contributor Agreement
// 0 !HISTORY 2008-07-01 [PTadmin] Official Update 2008-01
// 
// 
// 1 16 0 4 0 1 0 0 0 -5 0 0 0 1 stud3.dat
  [1,16,0,4,0,1,0,0,0,-5,0,0,0,1, ldraw_lib__stud3(realsolid)],
// 0 BFC INVERTNEXT
  [0,"BFC","INVERTNEXT"],
// 1 16 0 24 0 16 0 0 0 -20 0 0 0 6 box5.dat
  [1,16,0,24,0,16,0,0,0,-20,0,0,0,6, ldraw_lib__box5(realsolid)],
// 4 16 20 24 10 16 24 6 -16 24 6 -20 24 10
  [4,16,20,24,10,16,24,6,-16,24,6,-20,24,10],
// 4 16 -20 24 10 -16 24 6 -16 24 -6 -20 24 -10
  [4,16,-20,24,10,-16,24,6,-16,24,-6,-20,24,-10],
// 4 16 -20 24 -10 -16 24 -6 16 24 -6 20 24 -10
  [4,16,-20,24,-10,-16,24,-6,16,24,-6,20,24,-10],
// 4 16 20 24 -10 16 24 -6 16 24 6 20 24 10
  [4,16,20,24,-10,16,24,-6,16,24,6,20,24,10],
// 1 16 0 24 0 20 0 0 0 -24 0 0 0 10 box4t.dat
  [1,16,0,24,0,20,0,0,0,-24,0,0,0,10, ldraw_lib__box4t(realsolid)],
// 1 16 10 0 0 1 0 0 0 1 0 0 0 1 stud.dat
  [1,16,10,0,0,1,0,0,0,1,0,0,0,1, ldraw_lib__stud(realsolid)],
// 1 16 -10 0 0 1 0 0 0 1 0 0 0 1 stud.dat
  [1,16,-10,0,0,1,0,0,0,1,0,0,0,1, ldraw_lib__stud(realsolid)],
// 0
];
module ldraw_lib__s__3004s01(step=0, col=false, unit=2/5, alt=false, line=0.2, solid=!$preview)
    makepoly(ldraw_lib__s__3004s01(solid), step=step, col=col, unit=unit, alt=alt, line=line, solid=solid);
ldraw_lib__s__3004s01(line=0.2);
// file: s/3005s01.scad
use <../../lib.scad>
use <../../p/box4t.scad>
use <../../p/box5.scad>
use <../../p/stud.scad>
$fa=1; $fs=0.2;
function ldraw_lib__s__3005s01(realsolid=false) = [
// 0 ~Brick  1 x  1 without Front Face
// 0 Name: s\3005s01.dat
// 0 Author: John Riley [jriley]
// 0 !LDRAW_ORG Subpart UPDATE 2004-01
// 0 !LICENSE Licensed under CC BY 2.0 and CC BY 4.0 : see CAreadme.txt
// 
// 0 BFC CERTIFY CCW
  [0,"BFC","CERTIFY"],
  [0,"BFC","CCW"],
// 
// 0 !HISTORY 2003-09-07 [jriley] BFCed & Subfiled
// 0 !HISTORY 2004-03-02 [PTadmin] Official Update 2004-01
// 0 !HISTORY 2007-08-29 [PTadmin] Header formatted for Contributor Agreement
// 0 !HISTORY 2008-07-01 [PTadmin] Official Update 2008-01
// 
// 
// 0 BFC INVERTNEXT
  [0,"BFC","INVERTNEXT"],
// 1 16 0 24 0 0 0 6 0 -20 0 -6 0 0 box5.dat
  [1,16,0,24,0,0,0,6,0,-20,0,-6,0,0, ldraw_lib__box5(realsolid)],
// 4 16 10 24 -10 6 24 -6 6 24 6 10 24 10
  [4,16,10,24,-10,6,24,-6,6,24,6,10,24,10],
// 4 16 10 24 10 6 24 6 -6 24 6 -10 24 10
  [4,16,10,24,10,6,24,6,-6,24,6,-10,24,10],
// 4 16 -10 24 10 -6 24 6 -6 24 -6 -10 24 -10
  [4,16,-10,24,10,-6,24,6,-6,24,-6,-10,24,-10],
// 4 16 -10 24 -10 -6 24 -6 6 24 -6 10 24 -10
  [4,16,-10,24,-10,-6,24,-6,6,24,-6,10,24,-10],
// 1 16 0 24 0 10 0 0 0 -24 0 0 0 10 box4t.dat
  [1,16,0,24,0,10,0,0,0,-24,0,0,0,10, ldraw_lib__box4t(realsolid)],
// 1 16 0 0 0 0 0 1 0 1 0 -1 0 0 stud.dat
  [1,16,0,0,0,0,0,1,0,1,0,-1,0,0, ldraw_lib__stud(realsolid)],
// 0
];
module ldraw_lib__s__3005s01(step=0, col=false, unit=2/5, alt=false, line=0.2, solid=!$preview)
    makepoly(ldraw_lib__s__3005s01(solid), step=step, col=col, unit=unit, alt=alt, line=line, solid=solid);
ldraw_lib__s__3005s01(line=0.2);
// file: 3004.scad
use <../lib.scad>
use <s/3004s01.scad>
$fa=1; $fs=0.2;
function ldraw_lib__3004(realsolid=false) = [
// 0 Brick  1 x  2
// 0 Name: 3004.dat
// 0 Author: James Jessiman
// 0 !LDRAW_ORG Part UPDATE 2022-05
// 0 !LICENSE Licensed under CC BY 2.0 and CC BY 4.0 : see CAreadme.txt
// 
// 0 BFC CERTIFY CCW
  [0,"BFC","CERTIFY"],
  [0,"BFC","CCW"],
// 
// 0 !HISTORY 2001-10-26 [PTadmin] Official Update 2001-01
// 0 !HISTORY 2002-05-07 {unknown} BFC Certification
// 0 !HISTORY 2002-06-11 [PTadmin] Official Update 2002-03
// 0 !HISTORY 2007-05-07 [PTadmin] Header formatted for Contributor Agreement
// 0 !HISTORY 2008-07-01 [PTadmin] Official Update 2008-01
// 0 !HISTORY 2022-08-04 [MagFors] Using subfile
// 0 !HISTORY 2022-09-15 [PTadmin] Official Update 2022-05
// 
// 
// 1 16 0 0 0 1 0 0 0 1 0 0 0 1 s\3004s01.dat
  [1,16,0,0,0,1,0,0,0,1,0,0,0,1, ldraw_lib__s__3004s01(realsolid)],
// 4 16 -20 24 -10 20 24 -10 20 0 -10 -20 0 -10
  [4,16,-20,24,-10,20,24,-10,20,0,-10,-20,0,-10],
];
module ldraw_lib__3004(step=0, col=false, unit=2/5, alt=false, line=0.2, solid=!$preview)
    makepoly(ldraw_lib__3004(solid), step=step, col=col, unit=unit, alt=alt, line=line, solid=solid);
ldraw_lib__3004(line=0.2);
// file: 3005pta.scad
use <../lib.scad>
use <s/3005s01.scad>
$fa=1; $fs=0.2;
function ldraw_lib__3005pta(realsolid=false) = [
// 0 Brick  1 x  1 with Blue "A" Pattern
// 0 Name: 3005pta.dat
// 0 Author: Tore Eriksson [Tore_Eriksson]
// 0 !LDRAW_ORG Part UPDATE 2004-03
// 0 !LICENSE Licensed under CC BY 2.0 and CC BY 4.0 : see CAreadme.txt
// 
// 0 BFC CERTIFY CW
  [0,"BFC","CERTIFY"],
  [0,"BFC","CW"],
// 
// 0 !HISTORY 2003-12-09 [Steffen] made use of existing subfile
// 0 !HISTORY 2004-09-15 [PTadmin] Official Update 2004-03
// 0 !HISTORY 2007-05-11 [PTadmin] Header formatted for Contributor Agreement
// 0 !HISTORY 2008-07-01 [PTadmin] Official Update 2008-01
// 
// 
// 1 16 0 0 0 1 0 0 0 1 0 0 0 1 s\3005s01.dat
  [1,16,0,0,0,1,0,0,0,1,0,0,0,1, ldraw_lib__s__3005s01(realsolid)],
// 4 1 -6 19 -10 -1 5 -10 1 5 -10 -4 19 -10
  [4,1,-6,19,-10,-1,5,-10,1,5,-10,-4,19,-10],
// 4 1 4 19 -10 -1 5 -10 1 5 -10 6 19 -10
  [4,1,4,19,-10,-1,5,-10,1,5,-10,6,19,-10],
// 4 1 -3 16.2 -10 -2.25 14.1 -10 2.25 14.1 -10 3 16.2 -10
  [4,1,-3,16.2,-10,-2.25,14.1,-10,2.25,14.1,-10,3,16.2,-10],
// 4 16 -10 0 -10 10 0 -10 1 5 -10 -1 5 -10
  [4,16,-10,0,-10,10,0,-10,1,5,-10,-1,5,-10],
// 4 16 10 0 -10 10 24 -10 6 19 -10 1 5 -10
  [4,16,10,0,-10,10,24,-10,6,19,-10,1,5,-10],
// 4 16 10 24 -10 -10 24 -10 -6 19 -10 6 19 -10
  [4,16,10,24,-10,-10,24,-10,-6,19,-10,6,19,-10],
// 4 16 -1 5 -10 -6 19 -10 -10 24 -10 -10 0 -10
  [4,16,-1,5,-10,-6,19,-10,-10,24,-10,-10,0,-10],
// 4 16 3 16.2 -10 4 19 -10 -4 19 -10 -3 16.2 -10
  [4,16,3,16.2,-10,4,19,-10,-4,19,-10,-3,16.2,-10],
// 3 16 0 7.8 -10 2.25 14.1 -10 -2.25 14.1 -10
  [3,16,0,7.8,-10,2.25,14.1,-10,-2.25,14.1,-10],
// 0
];
module ldraw_lib__3005pta(step=0, col=false, unit=2/5, alt=false, line=0.2, solid=!$preview)
    makepoly(ldraw_lib__3005pta(solid), step=step, col=col, unit=unit, alt=alt, line=line, solid=solid);
ldraw_lib__3005pta(line=0.2);
// main file
use <../lib.scad>
use <3005pta.scad>
$fa=1; $fs=0.2;
function ldraw_lib__3005_a(realsolid=false) = [
// 0 ~Moved to 3005pta
// 0 Name: 3005-a.dat
// 0 Author: [PTadmin]
// 0 !LDRAW_ORG Part UPDATE 2004-03
// 0 !LICENSE Licensed under CC BY 4.0 : see CAreadme.txt
// 
// 0 BFC CERTIFY CCW
  [0,"BFC","CERTIFY"],
  [0,"BFC","CCW"],
// 
// 0 !HISTORY 1998-12-15 [PTadmin] Official Update 1998-10
// 0 !HISTORY 2004-09-15 [PTadmin] Official Update 2004-03
// 0 !HISTORY 2007-05-11 [PTadmin] Header formatted for Contributor Agreement
// 0 !HISTORY 2008-07-01 [PTadmin] Official Update 2008-01
// 
// 
// 1 16 0 0 0 1 0 0 0 1 0 0 0 1 3005pta.dat
  [1,16,0,0,0,1,0,0,0,1,0,0,0,1, ldraw_lib__3005pta(realsolid)],
];
module ldraw_lib__3005_a(step=0, col=false, unit=2/5, alt=false, line=0.2, solid=!$preview)
    makepoly(ldraw_lib__3005_a(solid), step=step, col=col, unit=unit, alt=alt, line=line, solid=solid);
ldraw_lib__3005_a(line=0.2);
